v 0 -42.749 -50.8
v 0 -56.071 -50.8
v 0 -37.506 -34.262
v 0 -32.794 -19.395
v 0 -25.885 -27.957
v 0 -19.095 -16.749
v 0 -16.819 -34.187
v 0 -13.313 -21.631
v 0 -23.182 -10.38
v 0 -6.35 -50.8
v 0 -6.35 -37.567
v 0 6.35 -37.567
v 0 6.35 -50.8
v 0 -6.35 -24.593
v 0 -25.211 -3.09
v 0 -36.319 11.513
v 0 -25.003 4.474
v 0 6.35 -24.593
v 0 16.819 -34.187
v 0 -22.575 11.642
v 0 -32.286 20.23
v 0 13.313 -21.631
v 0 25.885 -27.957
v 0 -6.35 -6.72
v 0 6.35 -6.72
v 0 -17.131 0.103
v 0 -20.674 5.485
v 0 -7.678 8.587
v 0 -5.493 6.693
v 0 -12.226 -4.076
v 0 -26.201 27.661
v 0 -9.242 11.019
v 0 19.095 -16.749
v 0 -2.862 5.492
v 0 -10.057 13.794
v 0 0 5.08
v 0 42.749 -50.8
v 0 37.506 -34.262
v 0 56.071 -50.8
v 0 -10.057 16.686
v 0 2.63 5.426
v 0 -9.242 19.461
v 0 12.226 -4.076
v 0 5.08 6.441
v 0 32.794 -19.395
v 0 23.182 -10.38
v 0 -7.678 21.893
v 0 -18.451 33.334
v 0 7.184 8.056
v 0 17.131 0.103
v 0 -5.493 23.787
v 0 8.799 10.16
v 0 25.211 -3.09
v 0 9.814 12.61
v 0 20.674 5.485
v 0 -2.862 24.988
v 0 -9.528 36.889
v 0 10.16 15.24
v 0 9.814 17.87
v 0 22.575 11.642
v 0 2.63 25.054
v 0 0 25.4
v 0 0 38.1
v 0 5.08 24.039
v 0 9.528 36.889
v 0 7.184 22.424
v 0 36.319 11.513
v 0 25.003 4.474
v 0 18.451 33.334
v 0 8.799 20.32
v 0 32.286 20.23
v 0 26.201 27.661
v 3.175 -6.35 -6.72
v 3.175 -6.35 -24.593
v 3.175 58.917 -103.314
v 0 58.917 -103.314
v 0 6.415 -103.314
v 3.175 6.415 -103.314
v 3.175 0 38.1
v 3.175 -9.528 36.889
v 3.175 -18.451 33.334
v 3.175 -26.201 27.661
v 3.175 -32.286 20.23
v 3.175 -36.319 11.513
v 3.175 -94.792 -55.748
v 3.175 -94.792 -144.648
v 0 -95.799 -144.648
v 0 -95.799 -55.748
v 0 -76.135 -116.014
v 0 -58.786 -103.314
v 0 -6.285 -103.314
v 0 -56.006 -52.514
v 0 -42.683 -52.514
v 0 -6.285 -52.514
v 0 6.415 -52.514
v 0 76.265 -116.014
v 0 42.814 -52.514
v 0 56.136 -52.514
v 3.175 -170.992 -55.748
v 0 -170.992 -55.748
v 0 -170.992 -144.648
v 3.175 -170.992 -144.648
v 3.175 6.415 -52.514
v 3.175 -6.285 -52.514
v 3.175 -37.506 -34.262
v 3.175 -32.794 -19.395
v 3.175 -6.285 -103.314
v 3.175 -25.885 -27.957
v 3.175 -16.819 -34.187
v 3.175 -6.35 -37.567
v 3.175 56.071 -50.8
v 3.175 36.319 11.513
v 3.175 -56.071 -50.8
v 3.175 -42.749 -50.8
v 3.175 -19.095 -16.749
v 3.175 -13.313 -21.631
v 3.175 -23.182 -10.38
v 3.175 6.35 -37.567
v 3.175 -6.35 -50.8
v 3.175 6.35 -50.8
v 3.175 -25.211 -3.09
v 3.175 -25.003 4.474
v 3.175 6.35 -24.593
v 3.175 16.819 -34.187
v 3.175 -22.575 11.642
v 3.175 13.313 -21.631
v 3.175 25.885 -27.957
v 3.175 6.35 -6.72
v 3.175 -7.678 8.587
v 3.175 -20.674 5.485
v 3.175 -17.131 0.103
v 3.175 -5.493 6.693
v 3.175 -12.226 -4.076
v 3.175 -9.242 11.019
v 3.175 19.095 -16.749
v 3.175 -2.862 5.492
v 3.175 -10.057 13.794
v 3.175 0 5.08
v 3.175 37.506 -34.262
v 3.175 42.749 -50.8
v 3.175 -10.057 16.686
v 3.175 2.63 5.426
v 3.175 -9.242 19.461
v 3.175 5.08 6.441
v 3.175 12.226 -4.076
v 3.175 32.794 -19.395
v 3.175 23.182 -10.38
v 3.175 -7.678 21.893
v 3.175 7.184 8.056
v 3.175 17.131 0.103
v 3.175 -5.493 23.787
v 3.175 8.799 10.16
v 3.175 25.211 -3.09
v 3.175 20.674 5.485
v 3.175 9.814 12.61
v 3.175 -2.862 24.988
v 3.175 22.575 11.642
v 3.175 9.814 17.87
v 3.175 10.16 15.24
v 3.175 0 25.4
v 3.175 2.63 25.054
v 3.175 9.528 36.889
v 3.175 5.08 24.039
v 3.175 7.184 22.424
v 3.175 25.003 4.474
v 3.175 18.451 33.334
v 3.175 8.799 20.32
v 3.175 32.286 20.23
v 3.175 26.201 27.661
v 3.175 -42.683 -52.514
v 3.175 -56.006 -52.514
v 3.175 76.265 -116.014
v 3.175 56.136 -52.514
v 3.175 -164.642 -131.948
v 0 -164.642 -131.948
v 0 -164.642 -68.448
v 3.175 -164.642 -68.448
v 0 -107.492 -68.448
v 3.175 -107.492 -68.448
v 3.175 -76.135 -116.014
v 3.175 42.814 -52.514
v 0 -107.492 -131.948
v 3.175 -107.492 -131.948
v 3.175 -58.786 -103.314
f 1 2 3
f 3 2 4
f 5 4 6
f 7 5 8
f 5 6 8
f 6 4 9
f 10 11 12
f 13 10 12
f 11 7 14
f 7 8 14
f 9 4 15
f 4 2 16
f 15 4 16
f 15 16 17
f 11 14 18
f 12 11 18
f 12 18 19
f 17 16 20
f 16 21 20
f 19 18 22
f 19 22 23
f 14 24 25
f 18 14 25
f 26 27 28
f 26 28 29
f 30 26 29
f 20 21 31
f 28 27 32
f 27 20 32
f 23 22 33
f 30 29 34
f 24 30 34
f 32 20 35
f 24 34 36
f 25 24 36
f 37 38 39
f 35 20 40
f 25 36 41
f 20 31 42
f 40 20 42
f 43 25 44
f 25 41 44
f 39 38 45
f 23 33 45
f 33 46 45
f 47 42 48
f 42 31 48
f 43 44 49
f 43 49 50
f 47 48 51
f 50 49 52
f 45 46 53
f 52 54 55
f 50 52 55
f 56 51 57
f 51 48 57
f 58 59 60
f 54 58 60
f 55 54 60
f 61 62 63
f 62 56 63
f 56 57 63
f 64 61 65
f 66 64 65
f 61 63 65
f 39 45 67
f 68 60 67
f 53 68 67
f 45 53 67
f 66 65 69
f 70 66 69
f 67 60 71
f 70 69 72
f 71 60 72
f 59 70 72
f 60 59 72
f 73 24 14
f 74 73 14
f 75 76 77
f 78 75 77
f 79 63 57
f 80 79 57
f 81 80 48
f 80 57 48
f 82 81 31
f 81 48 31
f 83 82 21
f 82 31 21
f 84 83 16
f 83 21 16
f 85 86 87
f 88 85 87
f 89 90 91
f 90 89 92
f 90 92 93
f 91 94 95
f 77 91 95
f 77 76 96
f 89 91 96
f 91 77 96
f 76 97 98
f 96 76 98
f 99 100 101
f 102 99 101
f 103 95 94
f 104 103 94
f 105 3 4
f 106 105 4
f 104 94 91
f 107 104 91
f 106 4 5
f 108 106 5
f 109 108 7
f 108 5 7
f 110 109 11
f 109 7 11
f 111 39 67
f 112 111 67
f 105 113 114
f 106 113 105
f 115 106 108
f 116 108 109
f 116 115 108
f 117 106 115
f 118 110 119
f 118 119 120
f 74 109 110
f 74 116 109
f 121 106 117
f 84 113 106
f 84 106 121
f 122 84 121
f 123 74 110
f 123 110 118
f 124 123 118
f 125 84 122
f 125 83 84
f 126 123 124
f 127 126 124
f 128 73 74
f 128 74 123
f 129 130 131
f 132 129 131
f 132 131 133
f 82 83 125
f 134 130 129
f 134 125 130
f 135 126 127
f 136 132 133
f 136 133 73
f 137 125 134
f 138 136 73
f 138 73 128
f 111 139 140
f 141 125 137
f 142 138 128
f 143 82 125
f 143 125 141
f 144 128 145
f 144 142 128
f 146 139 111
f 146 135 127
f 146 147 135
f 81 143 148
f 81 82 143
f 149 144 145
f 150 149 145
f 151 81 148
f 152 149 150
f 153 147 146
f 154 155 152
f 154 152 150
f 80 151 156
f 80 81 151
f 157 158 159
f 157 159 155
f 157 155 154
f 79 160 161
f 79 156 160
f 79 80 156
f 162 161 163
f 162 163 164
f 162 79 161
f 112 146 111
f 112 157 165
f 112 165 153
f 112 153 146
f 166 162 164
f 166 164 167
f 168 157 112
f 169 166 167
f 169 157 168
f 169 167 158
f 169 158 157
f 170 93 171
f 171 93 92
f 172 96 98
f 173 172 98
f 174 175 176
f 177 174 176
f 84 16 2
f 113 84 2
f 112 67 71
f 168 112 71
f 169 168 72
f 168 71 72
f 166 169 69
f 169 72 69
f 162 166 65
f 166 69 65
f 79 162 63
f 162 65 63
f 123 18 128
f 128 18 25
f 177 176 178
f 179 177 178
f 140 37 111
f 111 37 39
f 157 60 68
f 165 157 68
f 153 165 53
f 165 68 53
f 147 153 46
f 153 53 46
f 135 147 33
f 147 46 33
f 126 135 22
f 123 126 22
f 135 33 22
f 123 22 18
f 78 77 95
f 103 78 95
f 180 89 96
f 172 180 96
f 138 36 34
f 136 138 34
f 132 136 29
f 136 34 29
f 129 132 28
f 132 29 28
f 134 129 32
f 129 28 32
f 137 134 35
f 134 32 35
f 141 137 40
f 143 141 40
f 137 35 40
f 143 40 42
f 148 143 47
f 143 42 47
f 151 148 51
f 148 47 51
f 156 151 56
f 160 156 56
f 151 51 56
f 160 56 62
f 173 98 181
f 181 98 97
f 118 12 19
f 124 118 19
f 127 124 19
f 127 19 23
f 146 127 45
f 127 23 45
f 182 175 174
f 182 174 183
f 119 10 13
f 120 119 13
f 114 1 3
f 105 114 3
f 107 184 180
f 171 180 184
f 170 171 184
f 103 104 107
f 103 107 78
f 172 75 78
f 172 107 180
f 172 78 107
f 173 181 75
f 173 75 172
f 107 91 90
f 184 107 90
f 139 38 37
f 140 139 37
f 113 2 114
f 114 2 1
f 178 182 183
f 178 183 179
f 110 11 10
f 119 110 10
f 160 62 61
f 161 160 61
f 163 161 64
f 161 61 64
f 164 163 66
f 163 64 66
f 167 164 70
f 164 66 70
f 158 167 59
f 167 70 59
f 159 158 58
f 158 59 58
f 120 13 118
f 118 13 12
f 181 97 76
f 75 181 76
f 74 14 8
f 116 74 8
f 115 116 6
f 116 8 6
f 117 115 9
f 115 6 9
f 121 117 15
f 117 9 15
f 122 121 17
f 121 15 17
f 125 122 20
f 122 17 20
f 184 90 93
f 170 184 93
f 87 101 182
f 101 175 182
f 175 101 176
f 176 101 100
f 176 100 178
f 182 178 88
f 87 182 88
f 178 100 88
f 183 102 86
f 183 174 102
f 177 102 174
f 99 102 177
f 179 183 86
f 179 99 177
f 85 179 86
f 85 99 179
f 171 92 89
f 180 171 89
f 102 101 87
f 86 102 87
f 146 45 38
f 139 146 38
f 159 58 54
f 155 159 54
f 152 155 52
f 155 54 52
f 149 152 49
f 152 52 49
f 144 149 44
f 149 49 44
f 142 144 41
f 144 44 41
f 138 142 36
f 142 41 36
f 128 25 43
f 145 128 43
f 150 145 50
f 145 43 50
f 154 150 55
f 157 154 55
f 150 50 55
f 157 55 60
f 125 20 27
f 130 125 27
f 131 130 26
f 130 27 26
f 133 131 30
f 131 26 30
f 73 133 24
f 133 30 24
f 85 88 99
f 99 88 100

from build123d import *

# Parameters (mm, degrees)
F1_DEPTH = 3.175
F2_W     = 57.15
F2_H     = 63.5
F3_DEPTH = 3.175
F5_DEPTH = 88.9


with BuildPart() as f1:
    # F0 (on Right) → F1 (new body)
    with BuildSketch(Plane.YZ):
        with BuildLine():
            Line((56.071307, -50.8), (36.318986, 11.512657))
            ThreePointArc((36.318986, 11.512657), (22.505308, 30.742822), (0, 38.1))
            Line((0, 38.1), (0, 25.4))
            ThreePointArc((0, 25.4), (7.184205, 22.424205), (10.16, 15.24))
            ThreePointArc((10.16, 15.24), (7.184205, 8.055795), (0, 5.08))
            Line((0, 5.08), (0, -7.62))
            ThreePointArc((0, -7.62), (3.206706, -7.393971), (6.35, -6.720353))
            ThreePointArc((6.35, -6.720353), (17.130533, 0.103143), (22.575022, 11.641667))
            ThreePointArc((22.575022, 11.641667), (23.182106, -10.380268), (6.35, -24.593444))
            ThreePointArc((6.35, -24.593444), (3.200509, -25.197554), (0, -25.4))
            Line((0, -25.4), (0, -50.8))
            Line((0, -50.8), (6.35, -50.8))
            Line((6.35, -50.8), (6.35, -50.401562))
            Line((6.35, -50.401562), (6.35, -37.567107))
            ThreePointArc((6.35, -37.567107), (21.577978, -31.400651), (32.793685, -19.395469))
            Line((32.793685, -19.395469), (37.506329, -34.262448))
            Line((37.506329, -34.262448), (42.748523, -50.8))
            Line((42.748523, -50.8), (56.071307, -50.8))
        make_face()
        with BuildLine():
            Line((0, 25.4), (0, 38.1))
            ThreePointArc((0, 38.1), (-22.505308, 30.742822), (-36.318986, 11.512657))
            Line((-36.318986, 11.512657), (-56.071307, -50.8))
            Line((-56.071307, -50.8), (-42.748523, -50.8))
            Line((-42.748523, -50.8), (-37.506329, -34.262448))
            Line((-37.506329, -34.262448), (-32.793685, -19.395469))
            ThreePointArc((-32.793685, -19.395469), (-21.577978, -31.400651), (-6.35, -37.567107))
            Line((-6.35, -37.567107), (-6.35, -50.401562))
            Line((-6.35, -50.401562), (-6.35, -50.8))
            Line((-6.35, -50.8), (0, -50.8))
            Line((0, -50.8), (0, -25.4))
            ThreePointArc((0, -25.4), (-3.200509, -25.197554), (-6.35, -24.593444))
            ThreePointArc((-6.35, -24.593444), (-23.182106, -10.380268), (-22.575022, 11.641667))
            ThreePointArc((-22.575022, 11.641667), (-17.130533, 0.103143), (-6.35, -6.720353))
            ThreePointArc((-6.35, -6.720353), (-3.206706, -7.393971), (0, -7.62))
            Line((0, -7.62), (0, 5.08))
            ThreePointArc((0, 5.08), (-10.16, 15.24), (0, 25.4))
        make_face()
        with BuildLine():
            ThreePointArc((6.35, -6.720353), (3.206706, -7.393971), (0, -7.62))
            Line((0, -7.62), (0, -25.4))
            ThreePointArc((0, -25.4), (3.200509, -25.197554), (6.35, -24.593444))
            Line((6.35, -24.593444), (6.35, -6.720353))
        make_face()
        with BuildLine():
            Line((0, -25.4), (0, -7.62))
            ThreePointArc((0, -7.62), (-3.206706, -7.393971), (-6.35, -6.720353))
            Line((-6.35, -6.720353), (-6.35, -24.593444))
            ThreePointArc((-6.35, -24.593444), (-3.200509, -25.197554), (0, -25.4))
        make_face()
        Polygon((-56.006223, -52.513846), (-76.134917, -116.013846), (0.065083, -116.013846), (76.265083, -116.013846), (56.13639, -52.513846), (42.813606, -52.513846), (58.916561, -103.313846), (6.415083, -103.313846), (6.415083, -52.513846), (-6.284917, -52.513846), (-6.284917, -103.313846), (-58.786394, -103.313846), (-42.683439, -52.513846), align=None)
    extrude(amount=F1_DEPTH)


with BuildPart() as f3:
    # F2 (on Right) → F3 (new body)
    with BuildSketch(Plane.YZ):
        Polygon((-94.792434, -144.647602), (-94.792434, -55.747602), (-170.992434, -55.747602), (-170.992434, -81.147602), (-170.992434, -131.947602), (-170.992434, -144.647602), align=None)
        with Locations((-136.067434, -100.197602)):
            Rectangle(F2_W, F2_H, mode=Mode.SUBTRACT)
    extrude(amount=F3_DEPTH)

    # F4 (on face) → F5 (cut)
    with BuildSketch(Plane(origin=(0, 0, -144.647602), x_dir=(1, 0, 0), z_dir=(0, 0, -1))):
        Polygon((0, 94.792434), (3.175, 94.792434), (0, 95.798869), align=None)
    extrude(amount=-F5_DEPTH, mode=Mode.SUBTRACT)


solid = Compound([f1.part, f3.part])
